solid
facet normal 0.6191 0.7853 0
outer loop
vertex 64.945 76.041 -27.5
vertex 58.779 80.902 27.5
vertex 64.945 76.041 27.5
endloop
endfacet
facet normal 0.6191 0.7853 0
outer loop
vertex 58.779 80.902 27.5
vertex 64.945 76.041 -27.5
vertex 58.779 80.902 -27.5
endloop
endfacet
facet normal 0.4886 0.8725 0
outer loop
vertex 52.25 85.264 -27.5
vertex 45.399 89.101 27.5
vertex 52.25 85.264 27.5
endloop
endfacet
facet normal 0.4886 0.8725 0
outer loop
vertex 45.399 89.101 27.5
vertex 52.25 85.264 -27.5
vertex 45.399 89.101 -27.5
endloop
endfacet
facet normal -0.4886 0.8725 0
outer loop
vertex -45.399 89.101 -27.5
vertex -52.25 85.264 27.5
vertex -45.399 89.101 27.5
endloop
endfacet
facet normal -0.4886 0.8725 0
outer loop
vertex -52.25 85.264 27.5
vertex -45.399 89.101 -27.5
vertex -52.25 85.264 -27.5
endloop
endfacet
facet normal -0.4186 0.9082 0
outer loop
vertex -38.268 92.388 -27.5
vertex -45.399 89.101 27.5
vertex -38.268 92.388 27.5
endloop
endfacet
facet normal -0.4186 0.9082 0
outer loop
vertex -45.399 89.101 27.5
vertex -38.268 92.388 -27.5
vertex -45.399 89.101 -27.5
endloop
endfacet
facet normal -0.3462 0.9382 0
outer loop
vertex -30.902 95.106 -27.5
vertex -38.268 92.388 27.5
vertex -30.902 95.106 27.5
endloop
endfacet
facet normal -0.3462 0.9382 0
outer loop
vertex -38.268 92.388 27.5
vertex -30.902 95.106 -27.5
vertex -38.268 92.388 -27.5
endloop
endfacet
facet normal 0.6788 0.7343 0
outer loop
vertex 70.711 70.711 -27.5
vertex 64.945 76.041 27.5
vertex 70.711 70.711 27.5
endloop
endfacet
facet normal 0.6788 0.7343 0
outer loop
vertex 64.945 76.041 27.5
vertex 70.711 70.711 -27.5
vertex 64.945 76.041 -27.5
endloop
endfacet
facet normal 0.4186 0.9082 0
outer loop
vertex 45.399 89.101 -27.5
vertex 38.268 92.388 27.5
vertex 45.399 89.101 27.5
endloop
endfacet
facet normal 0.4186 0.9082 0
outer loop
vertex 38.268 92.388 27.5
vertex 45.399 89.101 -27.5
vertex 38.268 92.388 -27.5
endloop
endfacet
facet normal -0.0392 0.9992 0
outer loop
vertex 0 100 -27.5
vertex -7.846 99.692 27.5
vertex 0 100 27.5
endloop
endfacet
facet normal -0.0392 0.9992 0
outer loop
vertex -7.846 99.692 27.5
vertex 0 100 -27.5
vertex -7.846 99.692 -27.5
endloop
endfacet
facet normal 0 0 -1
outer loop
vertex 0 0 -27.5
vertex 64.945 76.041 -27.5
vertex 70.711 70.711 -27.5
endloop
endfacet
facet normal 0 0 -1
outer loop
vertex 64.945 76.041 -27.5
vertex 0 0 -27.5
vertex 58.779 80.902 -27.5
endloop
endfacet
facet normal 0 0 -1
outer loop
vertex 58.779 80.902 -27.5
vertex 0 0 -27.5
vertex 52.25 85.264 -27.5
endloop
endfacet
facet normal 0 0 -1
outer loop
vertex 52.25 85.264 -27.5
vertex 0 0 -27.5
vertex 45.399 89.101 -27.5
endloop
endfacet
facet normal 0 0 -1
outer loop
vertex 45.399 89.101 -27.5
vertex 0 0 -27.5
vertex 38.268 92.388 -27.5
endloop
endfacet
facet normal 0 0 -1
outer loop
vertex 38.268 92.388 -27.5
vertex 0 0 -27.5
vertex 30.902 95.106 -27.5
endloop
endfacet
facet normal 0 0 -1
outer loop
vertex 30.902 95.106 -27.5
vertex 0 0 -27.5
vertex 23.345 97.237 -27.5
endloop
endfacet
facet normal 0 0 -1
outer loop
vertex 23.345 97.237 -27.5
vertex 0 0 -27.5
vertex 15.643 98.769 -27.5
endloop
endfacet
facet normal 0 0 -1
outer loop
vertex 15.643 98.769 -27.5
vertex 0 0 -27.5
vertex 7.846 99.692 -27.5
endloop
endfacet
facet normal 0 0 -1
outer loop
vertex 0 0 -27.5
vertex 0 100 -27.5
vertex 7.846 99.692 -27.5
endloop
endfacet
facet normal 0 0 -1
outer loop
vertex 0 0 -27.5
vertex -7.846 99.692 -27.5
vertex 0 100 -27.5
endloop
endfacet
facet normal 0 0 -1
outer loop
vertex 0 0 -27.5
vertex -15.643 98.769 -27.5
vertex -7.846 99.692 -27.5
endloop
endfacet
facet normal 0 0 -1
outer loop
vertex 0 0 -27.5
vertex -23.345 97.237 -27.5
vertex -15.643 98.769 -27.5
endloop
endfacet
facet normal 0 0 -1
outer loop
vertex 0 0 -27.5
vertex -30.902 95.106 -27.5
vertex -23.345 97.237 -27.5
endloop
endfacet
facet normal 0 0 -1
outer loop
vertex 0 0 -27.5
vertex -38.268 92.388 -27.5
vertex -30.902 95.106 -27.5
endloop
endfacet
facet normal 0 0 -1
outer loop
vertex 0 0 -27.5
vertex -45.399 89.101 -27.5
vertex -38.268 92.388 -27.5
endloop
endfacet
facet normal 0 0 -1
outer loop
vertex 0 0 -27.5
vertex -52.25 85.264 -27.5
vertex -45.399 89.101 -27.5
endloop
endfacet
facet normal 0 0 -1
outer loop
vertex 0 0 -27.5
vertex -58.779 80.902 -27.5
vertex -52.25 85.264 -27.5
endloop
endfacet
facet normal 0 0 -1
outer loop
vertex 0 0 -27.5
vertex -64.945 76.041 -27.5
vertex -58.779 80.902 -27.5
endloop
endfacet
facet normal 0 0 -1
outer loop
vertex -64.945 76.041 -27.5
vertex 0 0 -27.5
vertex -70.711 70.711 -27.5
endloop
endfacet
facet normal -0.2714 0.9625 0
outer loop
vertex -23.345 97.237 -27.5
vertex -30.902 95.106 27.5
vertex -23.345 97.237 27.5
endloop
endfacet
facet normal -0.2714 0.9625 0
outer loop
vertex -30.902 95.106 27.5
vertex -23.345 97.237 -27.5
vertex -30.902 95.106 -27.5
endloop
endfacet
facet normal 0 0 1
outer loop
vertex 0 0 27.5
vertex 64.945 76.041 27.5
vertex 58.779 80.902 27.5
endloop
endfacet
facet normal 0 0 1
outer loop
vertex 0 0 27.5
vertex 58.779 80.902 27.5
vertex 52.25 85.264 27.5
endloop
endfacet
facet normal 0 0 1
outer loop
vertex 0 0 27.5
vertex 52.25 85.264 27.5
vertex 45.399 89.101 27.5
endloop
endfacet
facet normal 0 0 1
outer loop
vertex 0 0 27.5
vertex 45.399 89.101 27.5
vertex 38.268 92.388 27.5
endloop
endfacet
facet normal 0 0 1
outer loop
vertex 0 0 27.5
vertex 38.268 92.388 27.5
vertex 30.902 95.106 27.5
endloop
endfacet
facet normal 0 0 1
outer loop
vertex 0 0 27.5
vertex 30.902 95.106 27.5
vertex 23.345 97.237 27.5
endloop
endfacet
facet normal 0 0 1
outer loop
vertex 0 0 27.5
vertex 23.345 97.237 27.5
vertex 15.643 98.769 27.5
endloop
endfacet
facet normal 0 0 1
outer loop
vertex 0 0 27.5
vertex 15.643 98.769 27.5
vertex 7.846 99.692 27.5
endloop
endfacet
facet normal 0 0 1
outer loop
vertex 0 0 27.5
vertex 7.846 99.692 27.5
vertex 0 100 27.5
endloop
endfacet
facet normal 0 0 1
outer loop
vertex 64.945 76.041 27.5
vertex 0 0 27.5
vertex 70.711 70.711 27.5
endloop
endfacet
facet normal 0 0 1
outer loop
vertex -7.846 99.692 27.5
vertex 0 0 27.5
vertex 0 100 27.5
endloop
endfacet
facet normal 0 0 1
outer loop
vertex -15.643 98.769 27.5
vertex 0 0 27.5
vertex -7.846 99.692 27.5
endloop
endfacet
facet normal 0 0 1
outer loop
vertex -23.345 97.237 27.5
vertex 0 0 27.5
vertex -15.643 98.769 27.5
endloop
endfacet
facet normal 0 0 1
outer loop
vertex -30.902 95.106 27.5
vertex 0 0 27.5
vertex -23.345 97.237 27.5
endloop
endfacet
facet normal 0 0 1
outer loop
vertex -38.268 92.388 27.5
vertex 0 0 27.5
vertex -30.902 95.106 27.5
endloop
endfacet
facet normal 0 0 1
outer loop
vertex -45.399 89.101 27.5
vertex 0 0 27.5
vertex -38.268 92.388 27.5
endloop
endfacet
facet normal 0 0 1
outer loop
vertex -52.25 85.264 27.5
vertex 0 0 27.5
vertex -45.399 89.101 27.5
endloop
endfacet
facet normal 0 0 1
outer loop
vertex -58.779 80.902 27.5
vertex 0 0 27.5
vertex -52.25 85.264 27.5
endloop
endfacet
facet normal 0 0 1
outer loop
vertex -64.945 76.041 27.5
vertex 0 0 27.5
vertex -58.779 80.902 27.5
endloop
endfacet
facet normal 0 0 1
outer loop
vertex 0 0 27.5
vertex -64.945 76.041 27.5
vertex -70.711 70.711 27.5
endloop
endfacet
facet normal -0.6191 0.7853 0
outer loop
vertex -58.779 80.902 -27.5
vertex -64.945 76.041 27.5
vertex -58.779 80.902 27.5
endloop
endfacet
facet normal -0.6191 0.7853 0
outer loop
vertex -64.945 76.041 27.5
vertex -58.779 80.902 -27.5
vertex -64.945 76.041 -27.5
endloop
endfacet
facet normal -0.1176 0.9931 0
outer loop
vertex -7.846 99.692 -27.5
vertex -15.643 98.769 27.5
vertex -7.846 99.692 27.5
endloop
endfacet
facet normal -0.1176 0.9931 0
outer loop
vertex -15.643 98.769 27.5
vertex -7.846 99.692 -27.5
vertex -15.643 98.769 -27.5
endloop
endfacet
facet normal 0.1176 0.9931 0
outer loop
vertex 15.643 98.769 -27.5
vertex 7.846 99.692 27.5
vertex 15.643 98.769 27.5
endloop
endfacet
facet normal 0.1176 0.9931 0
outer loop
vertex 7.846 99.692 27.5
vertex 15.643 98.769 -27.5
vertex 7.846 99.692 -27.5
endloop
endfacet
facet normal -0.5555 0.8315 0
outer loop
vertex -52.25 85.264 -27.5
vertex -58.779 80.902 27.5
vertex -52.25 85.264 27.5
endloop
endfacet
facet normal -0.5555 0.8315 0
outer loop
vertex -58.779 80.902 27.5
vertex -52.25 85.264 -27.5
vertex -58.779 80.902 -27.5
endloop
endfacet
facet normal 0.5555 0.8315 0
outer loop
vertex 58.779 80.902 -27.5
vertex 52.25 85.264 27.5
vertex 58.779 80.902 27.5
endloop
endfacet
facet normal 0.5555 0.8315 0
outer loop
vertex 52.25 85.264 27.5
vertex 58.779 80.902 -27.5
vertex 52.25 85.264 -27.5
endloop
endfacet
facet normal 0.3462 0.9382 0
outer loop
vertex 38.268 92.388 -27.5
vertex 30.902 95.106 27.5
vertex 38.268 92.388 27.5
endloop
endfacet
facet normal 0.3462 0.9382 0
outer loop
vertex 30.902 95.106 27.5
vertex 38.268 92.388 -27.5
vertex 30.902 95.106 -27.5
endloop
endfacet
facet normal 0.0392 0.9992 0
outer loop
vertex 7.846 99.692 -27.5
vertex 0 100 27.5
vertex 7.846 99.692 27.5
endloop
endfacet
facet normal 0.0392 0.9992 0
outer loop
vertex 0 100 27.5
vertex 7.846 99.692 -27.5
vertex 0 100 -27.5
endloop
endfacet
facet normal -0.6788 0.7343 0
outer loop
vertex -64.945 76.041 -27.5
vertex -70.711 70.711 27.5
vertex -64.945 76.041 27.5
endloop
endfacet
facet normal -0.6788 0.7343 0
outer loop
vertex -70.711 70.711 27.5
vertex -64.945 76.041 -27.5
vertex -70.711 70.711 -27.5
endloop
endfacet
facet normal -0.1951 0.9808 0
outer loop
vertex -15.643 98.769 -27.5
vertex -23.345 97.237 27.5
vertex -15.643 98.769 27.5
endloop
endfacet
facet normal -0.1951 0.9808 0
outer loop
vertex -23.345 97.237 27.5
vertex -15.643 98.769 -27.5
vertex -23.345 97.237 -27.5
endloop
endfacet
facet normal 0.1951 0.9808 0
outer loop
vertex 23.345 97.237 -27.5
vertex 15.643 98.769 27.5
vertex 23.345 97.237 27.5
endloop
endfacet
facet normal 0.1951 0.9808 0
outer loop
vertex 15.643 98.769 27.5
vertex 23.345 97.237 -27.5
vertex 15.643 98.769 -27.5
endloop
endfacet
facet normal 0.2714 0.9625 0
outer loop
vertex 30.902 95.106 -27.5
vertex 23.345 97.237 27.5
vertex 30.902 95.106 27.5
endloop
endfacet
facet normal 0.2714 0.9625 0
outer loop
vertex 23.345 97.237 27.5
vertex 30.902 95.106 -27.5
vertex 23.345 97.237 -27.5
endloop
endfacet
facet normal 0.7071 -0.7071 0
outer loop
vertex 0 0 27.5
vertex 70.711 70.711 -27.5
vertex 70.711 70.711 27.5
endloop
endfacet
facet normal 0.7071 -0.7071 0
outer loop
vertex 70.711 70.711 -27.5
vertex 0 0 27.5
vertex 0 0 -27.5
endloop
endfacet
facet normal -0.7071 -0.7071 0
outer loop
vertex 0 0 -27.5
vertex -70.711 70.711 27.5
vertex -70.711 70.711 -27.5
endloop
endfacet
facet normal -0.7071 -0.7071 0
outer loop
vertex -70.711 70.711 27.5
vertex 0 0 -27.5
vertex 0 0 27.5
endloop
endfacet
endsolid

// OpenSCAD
showFront = false;
showBack = true;

boxLenX = 150;
boxLenY = 134;
boxLenZ = 55;
boxThickness = 6;
radiusCorner = 15;


$fn = 80;

/*
union()
{
    difference()
    {
        roundFrame([boxLenX, boxLenY, boxLenZ], radiusCorner , center=true);
        
        roundFrame([boxLenX-boxThickness, boxLenY-boxThickness, boxLenZ+2], radiusCorner , center=true);
        
        translate([0, 0, boxLenZ/2])
            roundCube([boxLenX-boxThickness/2, boxLenY-boxThickness/2, 2], radiusCorner , center=true);
        
        translate([0, 0, -boxLenZ/2])
            roundCube([boxLenX-boxThickness/2, boxLenY-boxThickness/2, 2], radiusCorner , center=true);
    }
}

if(showFront)
{
 
    color([0.6,0.6,0.6])
         translate([0, 0, boxLenZ/2-1])
            roundCube([boxLenX-boxThickness/2, boxLenY-boxThickness/2, 2], radiusCorner , center=true);   
    
}

pa = 5;

module roundFrame(v, r, center)
{
    //hull()
    {
        translate([ v[0]/2-r-pa,  v[1]/2-r, 0]) cylinder(v[2], r, r, center);
        translate([-v[0]/2+r+pa,  v[1]/2-r, 0]) cylinder(v[2], r, r, center);
        translate([-v[0]/2+r, -v[1]/2+r, 0]) cylinder(v[2], r, r, center);
        translate([ v[0]/2-r, -v[1]/2+r, 0]) cylinder(v[2], r, r, center);
        translate([ 0, v[1]/2-60, 0]) cylinderPart(v[2], 70);
       
        translate([v[0]/2-6, 0, 0])
        {
            rotate([0,0,2])
                scale([0.5, 2.6, 1.2])
                    sphere(20);
        }
               
        translate([-v[0]/2+6, 0, 0])
        {
            rotate([0,0,-2])
                scale([0.5, 2.8, 1.2])
                    sphere(20);
        }
    }
}
*/

cylinderPart(55,100, 45);

module cylinderPart(height, radius, angle)
{
    difference()
    {
        cylinder(height, radius, radius, center=true);
        
        translate([0, -radius/2, 0])
            cube([200, radius, height+1], center=true);
        
        rotate([0,0,angle])
            translate([0, -radius/2, 0])
                cube([200, radius, height+1], center=true);
        
        rotate([0,0,-angle])
            translate([0, -radius/2, 0])
                cube([200, radius, height+1], center=true);
    }
}


module roundCube(v, r, center)
{
    hull()
    {
        translate([ v[0]/2-r-pa,  v[1]/2-r, 0]) cylinder(v[2], r, r, center);
        translate([-v[0]/2+r+pa,  v[1]/2-r, 0]) cylinder(v[2], r, r, center);
        translate([-v[0]/2+r, -v[1]/2+r, 0]) cylinder(v[2], r, r, center);
        translate([ v[0]/2-r, -v[1]/2+r, 0]) cylinder(v[2], r, r, center);
    }
}
